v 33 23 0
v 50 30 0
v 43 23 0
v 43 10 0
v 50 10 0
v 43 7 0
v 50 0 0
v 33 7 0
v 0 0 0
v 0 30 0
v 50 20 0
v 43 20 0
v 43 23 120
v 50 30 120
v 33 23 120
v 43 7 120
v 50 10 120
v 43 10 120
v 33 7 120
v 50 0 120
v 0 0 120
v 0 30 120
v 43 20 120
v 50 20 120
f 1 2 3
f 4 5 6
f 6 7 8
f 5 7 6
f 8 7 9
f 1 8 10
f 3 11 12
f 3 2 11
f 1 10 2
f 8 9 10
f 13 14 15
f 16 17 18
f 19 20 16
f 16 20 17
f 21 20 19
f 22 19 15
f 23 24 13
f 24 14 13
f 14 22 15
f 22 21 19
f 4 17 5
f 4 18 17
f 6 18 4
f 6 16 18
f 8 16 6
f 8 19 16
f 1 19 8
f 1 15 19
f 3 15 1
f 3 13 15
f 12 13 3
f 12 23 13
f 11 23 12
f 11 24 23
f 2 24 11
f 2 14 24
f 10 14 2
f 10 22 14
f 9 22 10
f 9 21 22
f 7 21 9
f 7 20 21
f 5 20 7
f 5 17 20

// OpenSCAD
$fn = 32;

// ----------------------------------------------------------------------
// T-slot rail: 50 x 30 mm section, 120 mm long
// ----------------------------------------------------------------------

// --- parameters (mm) ---
profile_height = 120;     // extrusion height
profile_points = 12;      // points of the closed outline

profile = [[0, 0], [50, 0], [50, 10], [43, 10], [43, 7], [33, 7], [33, 23], [43, 23], [43, 20], [50, 20], [50, 30], [0, 30]];  // single closed polygon, 12 points, counter clockwise

// --- the one profile operation ---
linear_extrude(height = profile_height) polygon(points = profile);
